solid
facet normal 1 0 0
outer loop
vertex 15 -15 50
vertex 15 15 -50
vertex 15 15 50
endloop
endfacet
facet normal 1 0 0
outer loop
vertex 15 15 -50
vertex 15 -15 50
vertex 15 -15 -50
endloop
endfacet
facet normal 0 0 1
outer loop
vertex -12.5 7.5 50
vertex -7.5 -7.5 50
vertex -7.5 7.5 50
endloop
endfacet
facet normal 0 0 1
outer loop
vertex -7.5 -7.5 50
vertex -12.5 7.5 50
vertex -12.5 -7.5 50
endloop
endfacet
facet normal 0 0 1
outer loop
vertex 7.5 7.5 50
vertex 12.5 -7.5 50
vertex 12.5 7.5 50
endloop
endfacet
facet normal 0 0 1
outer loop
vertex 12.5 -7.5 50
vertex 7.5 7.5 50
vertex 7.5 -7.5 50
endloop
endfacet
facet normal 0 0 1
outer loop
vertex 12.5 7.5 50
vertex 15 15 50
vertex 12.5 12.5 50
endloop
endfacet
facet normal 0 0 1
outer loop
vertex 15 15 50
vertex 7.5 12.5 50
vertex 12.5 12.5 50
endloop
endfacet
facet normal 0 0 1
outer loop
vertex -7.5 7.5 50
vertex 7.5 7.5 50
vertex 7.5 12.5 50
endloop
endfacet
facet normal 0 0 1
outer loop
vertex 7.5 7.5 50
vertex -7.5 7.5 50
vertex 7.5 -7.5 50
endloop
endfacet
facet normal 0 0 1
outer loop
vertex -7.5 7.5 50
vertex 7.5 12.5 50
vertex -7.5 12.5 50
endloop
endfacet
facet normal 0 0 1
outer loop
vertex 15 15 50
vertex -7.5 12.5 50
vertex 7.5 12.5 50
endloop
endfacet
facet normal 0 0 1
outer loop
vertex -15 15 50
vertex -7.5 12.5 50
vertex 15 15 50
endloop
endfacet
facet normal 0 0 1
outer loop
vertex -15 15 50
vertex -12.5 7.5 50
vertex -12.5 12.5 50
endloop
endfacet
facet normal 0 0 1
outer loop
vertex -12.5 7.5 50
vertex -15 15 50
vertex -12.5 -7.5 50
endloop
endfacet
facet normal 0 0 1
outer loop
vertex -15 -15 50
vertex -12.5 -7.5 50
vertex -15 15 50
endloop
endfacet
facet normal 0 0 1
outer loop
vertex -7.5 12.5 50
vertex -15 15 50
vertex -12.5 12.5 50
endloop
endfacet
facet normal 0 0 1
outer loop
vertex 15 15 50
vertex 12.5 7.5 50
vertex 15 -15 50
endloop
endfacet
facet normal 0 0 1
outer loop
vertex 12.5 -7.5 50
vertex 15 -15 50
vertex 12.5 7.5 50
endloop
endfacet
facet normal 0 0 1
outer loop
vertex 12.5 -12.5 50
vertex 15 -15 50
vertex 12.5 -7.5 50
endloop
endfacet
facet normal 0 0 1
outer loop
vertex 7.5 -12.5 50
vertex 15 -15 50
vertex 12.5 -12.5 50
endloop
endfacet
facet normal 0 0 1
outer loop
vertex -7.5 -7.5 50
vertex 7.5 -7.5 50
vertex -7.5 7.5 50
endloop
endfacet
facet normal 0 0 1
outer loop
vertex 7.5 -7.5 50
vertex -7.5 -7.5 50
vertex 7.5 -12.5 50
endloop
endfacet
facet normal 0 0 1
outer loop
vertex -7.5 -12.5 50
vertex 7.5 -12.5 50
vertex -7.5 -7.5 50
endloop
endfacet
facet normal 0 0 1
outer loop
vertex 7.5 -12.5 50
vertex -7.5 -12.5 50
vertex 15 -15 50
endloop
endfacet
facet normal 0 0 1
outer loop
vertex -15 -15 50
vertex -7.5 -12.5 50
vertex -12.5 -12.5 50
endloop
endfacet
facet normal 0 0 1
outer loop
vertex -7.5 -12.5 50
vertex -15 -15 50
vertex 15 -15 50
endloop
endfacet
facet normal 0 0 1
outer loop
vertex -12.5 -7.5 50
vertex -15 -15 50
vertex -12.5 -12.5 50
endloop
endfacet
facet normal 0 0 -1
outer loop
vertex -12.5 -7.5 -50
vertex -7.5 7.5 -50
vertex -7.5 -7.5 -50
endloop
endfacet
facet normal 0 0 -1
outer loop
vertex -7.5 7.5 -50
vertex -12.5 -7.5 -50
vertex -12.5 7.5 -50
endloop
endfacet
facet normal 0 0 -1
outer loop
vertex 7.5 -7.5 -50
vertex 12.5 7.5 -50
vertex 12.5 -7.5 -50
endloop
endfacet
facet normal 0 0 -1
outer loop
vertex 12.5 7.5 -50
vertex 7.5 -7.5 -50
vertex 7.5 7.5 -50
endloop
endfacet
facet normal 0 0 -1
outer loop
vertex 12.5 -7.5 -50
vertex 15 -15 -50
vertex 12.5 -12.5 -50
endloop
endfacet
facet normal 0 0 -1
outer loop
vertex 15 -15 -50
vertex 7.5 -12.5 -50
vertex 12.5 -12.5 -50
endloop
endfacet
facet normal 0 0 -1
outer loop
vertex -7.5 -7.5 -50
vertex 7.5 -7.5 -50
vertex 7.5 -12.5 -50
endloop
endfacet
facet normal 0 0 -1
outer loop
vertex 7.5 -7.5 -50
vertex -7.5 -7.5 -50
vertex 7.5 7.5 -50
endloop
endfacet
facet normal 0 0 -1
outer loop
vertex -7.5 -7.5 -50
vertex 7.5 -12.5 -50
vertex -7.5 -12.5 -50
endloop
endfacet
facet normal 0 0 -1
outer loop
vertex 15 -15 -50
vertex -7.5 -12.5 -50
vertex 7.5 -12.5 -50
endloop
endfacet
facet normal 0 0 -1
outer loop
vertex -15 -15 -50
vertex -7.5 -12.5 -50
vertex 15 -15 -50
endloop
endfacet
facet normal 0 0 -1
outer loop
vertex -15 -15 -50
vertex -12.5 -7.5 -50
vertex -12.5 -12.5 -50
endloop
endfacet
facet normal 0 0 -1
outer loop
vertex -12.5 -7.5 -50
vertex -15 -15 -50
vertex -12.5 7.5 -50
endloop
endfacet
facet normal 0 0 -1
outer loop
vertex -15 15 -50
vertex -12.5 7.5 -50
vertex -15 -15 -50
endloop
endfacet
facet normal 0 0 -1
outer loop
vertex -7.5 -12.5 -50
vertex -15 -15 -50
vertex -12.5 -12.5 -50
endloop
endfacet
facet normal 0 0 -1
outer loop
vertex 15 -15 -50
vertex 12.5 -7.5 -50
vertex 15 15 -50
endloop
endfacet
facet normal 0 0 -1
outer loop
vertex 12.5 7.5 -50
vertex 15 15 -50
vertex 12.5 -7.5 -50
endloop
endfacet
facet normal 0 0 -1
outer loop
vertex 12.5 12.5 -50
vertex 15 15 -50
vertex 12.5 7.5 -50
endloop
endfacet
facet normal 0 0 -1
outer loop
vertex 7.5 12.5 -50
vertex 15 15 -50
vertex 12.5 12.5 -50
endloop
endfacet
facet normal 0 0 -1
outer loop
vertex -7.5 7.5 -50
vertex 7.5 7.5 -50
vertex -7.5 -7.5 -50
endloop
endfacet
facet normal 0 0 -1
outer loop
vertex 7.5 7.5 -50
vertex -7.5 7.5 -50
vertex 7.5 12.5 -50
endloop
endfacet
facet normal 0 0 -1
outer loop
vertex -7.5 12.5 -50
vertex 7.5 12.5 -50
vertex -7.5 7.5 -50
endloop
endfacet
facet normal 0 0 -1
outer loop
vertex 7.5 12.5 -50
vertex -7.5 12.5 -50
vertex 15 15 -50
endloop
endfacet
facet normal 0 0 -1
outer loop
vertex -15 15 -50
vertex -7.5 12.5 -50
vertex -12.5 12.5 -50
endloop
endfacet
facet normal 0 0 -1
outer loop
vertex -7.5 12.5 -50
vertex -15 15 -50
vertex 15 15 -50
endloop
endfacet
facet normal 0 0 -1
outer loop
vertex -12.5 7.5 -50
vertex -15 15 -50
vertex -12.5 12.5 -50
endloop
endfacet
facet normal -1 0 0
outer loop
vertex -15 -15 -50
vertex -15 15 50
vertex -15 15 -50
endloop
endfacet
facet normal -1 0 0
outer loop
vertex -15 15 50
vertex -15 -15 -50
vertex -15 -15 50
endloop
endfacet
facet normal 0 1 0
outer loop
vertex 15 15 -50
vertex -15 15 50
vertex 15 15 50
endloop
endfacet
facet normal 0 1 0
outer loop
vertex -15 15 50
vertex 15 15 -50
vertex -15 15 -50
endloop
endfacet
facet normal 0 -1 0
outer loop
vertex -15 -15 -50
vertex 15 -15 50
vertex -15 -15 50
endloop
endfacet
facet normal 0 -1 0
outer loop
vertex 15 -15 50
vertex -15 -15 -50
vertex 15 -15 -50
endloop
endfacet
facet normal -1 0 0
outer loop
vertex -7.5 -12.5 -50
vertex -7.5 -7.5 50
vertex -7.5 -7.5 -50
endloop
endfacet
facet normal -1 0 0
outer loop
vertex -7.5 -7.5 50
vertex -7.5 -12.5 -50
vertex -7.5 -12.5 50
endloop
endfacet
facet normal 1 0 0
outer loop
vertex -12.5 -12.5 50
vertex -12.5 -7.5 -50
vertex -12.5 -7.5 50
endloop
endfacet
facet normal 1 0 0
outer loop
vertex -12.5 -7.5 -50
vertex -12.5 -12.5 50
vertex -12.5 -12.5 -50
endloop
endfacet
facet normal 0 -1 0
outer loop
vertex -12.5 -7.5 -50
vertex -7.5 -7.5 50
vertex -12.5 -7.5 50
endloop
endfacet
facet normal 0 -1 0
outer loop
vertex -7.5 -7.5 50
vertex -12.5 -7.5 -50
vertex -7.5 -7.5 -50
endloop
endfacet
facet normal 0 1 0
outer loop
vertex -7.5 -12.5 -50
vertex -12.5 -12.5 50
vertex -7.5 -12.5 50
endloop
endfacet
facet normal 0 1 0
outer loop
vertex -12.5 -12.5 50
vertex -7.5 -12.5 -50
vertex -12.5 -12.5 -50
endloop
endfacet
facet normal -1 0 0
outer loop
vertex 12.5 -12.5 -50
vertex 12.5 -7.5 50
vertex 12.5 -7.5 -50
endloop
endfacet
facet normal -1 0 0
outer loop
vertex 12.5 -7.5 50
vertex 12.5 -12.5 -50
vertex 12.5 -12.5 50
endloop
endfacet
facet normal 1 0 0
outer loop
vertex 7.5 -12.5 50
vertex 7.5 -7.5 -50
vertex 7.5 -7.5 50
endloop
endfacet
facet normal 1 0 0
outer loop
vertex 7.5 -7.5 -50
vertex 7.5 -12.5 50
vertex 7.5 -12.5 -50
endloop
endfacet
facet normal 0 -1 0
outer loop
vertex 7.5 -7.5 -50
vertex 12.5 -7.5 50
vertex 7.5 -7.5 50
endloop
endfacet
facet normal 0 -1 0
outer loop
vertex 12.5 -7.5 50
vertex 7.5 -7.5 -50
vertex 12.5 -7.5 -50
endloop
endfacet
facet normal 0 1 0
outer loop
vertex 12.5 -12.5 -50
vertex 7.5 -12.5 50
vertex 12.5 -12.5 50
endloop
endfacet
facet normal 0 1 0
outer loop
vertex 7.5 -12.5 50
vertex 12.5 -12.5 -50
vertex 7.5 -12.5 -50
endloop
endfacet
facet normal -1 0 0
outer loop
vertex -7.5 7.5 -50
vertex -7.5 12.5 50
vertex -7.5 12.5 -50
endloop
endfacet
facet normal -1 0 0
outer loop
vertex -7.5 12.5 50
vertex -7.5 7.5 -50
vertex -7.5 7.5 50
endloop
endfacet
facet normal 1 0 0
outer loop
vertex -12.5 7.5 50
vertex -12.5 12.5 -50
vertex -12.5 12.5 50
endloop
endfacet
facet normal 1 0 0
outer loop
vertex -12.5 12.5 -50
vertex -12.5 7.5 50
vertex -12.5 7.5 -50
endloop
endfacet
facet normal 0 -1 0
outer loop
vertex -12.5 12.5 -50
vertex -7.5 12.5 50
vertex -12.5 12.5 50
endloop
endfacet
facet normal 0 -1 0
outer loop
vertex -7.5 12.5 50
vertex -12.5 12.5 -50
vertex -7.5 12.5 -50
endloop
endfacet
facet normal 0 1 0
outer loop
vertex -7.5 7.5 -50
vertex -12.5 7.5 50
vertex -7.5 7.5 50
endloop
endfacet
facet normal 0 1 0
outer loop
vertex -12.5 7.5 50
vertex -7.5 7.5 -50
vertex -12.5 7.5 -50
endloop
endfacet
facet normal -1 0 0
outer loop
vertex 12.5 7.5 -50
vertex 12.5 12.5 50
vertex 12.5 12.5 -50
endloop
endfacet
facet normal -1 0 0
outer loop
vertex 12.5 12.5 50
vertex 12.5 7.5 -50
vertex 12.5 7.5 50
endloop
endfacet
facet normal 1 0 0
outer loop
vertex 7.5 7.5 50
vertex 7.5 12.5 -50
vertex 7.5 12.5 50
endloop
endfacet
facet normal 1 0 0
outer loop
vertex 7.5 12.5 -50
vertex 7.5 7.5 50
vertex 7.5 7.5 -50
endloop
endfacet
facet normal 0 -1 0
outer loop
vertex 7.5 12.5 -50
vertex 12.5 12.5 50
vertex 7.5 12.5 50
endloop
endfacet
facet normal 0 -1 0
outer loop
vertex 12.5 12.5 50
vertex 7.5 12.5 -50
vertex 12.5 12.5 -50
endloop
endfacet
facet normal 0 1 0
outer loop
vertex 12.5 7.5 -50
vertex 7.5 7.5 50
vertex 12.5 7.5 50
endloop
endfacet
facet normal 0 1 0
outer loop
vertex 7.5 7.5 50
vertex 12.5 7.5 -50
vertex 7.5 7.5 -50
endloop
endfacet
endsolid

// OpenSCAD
module aluminium_extrusion() {
    difference() {
        cube([30, 30, 100], center = true);
        translate([-12.5, -12.5, -50])
            cube([5, 5, 100]);
        translate([7.5, -12.5, -50])
            cube([5, 5, 100]);
        translate([-12.5, 7.5, -50])
            cube([5, 5, 100]);
        translate([7.5, 7.5, -50])
            cube([5, 5, 100]);
    }
}

aluminium_extrusion();
